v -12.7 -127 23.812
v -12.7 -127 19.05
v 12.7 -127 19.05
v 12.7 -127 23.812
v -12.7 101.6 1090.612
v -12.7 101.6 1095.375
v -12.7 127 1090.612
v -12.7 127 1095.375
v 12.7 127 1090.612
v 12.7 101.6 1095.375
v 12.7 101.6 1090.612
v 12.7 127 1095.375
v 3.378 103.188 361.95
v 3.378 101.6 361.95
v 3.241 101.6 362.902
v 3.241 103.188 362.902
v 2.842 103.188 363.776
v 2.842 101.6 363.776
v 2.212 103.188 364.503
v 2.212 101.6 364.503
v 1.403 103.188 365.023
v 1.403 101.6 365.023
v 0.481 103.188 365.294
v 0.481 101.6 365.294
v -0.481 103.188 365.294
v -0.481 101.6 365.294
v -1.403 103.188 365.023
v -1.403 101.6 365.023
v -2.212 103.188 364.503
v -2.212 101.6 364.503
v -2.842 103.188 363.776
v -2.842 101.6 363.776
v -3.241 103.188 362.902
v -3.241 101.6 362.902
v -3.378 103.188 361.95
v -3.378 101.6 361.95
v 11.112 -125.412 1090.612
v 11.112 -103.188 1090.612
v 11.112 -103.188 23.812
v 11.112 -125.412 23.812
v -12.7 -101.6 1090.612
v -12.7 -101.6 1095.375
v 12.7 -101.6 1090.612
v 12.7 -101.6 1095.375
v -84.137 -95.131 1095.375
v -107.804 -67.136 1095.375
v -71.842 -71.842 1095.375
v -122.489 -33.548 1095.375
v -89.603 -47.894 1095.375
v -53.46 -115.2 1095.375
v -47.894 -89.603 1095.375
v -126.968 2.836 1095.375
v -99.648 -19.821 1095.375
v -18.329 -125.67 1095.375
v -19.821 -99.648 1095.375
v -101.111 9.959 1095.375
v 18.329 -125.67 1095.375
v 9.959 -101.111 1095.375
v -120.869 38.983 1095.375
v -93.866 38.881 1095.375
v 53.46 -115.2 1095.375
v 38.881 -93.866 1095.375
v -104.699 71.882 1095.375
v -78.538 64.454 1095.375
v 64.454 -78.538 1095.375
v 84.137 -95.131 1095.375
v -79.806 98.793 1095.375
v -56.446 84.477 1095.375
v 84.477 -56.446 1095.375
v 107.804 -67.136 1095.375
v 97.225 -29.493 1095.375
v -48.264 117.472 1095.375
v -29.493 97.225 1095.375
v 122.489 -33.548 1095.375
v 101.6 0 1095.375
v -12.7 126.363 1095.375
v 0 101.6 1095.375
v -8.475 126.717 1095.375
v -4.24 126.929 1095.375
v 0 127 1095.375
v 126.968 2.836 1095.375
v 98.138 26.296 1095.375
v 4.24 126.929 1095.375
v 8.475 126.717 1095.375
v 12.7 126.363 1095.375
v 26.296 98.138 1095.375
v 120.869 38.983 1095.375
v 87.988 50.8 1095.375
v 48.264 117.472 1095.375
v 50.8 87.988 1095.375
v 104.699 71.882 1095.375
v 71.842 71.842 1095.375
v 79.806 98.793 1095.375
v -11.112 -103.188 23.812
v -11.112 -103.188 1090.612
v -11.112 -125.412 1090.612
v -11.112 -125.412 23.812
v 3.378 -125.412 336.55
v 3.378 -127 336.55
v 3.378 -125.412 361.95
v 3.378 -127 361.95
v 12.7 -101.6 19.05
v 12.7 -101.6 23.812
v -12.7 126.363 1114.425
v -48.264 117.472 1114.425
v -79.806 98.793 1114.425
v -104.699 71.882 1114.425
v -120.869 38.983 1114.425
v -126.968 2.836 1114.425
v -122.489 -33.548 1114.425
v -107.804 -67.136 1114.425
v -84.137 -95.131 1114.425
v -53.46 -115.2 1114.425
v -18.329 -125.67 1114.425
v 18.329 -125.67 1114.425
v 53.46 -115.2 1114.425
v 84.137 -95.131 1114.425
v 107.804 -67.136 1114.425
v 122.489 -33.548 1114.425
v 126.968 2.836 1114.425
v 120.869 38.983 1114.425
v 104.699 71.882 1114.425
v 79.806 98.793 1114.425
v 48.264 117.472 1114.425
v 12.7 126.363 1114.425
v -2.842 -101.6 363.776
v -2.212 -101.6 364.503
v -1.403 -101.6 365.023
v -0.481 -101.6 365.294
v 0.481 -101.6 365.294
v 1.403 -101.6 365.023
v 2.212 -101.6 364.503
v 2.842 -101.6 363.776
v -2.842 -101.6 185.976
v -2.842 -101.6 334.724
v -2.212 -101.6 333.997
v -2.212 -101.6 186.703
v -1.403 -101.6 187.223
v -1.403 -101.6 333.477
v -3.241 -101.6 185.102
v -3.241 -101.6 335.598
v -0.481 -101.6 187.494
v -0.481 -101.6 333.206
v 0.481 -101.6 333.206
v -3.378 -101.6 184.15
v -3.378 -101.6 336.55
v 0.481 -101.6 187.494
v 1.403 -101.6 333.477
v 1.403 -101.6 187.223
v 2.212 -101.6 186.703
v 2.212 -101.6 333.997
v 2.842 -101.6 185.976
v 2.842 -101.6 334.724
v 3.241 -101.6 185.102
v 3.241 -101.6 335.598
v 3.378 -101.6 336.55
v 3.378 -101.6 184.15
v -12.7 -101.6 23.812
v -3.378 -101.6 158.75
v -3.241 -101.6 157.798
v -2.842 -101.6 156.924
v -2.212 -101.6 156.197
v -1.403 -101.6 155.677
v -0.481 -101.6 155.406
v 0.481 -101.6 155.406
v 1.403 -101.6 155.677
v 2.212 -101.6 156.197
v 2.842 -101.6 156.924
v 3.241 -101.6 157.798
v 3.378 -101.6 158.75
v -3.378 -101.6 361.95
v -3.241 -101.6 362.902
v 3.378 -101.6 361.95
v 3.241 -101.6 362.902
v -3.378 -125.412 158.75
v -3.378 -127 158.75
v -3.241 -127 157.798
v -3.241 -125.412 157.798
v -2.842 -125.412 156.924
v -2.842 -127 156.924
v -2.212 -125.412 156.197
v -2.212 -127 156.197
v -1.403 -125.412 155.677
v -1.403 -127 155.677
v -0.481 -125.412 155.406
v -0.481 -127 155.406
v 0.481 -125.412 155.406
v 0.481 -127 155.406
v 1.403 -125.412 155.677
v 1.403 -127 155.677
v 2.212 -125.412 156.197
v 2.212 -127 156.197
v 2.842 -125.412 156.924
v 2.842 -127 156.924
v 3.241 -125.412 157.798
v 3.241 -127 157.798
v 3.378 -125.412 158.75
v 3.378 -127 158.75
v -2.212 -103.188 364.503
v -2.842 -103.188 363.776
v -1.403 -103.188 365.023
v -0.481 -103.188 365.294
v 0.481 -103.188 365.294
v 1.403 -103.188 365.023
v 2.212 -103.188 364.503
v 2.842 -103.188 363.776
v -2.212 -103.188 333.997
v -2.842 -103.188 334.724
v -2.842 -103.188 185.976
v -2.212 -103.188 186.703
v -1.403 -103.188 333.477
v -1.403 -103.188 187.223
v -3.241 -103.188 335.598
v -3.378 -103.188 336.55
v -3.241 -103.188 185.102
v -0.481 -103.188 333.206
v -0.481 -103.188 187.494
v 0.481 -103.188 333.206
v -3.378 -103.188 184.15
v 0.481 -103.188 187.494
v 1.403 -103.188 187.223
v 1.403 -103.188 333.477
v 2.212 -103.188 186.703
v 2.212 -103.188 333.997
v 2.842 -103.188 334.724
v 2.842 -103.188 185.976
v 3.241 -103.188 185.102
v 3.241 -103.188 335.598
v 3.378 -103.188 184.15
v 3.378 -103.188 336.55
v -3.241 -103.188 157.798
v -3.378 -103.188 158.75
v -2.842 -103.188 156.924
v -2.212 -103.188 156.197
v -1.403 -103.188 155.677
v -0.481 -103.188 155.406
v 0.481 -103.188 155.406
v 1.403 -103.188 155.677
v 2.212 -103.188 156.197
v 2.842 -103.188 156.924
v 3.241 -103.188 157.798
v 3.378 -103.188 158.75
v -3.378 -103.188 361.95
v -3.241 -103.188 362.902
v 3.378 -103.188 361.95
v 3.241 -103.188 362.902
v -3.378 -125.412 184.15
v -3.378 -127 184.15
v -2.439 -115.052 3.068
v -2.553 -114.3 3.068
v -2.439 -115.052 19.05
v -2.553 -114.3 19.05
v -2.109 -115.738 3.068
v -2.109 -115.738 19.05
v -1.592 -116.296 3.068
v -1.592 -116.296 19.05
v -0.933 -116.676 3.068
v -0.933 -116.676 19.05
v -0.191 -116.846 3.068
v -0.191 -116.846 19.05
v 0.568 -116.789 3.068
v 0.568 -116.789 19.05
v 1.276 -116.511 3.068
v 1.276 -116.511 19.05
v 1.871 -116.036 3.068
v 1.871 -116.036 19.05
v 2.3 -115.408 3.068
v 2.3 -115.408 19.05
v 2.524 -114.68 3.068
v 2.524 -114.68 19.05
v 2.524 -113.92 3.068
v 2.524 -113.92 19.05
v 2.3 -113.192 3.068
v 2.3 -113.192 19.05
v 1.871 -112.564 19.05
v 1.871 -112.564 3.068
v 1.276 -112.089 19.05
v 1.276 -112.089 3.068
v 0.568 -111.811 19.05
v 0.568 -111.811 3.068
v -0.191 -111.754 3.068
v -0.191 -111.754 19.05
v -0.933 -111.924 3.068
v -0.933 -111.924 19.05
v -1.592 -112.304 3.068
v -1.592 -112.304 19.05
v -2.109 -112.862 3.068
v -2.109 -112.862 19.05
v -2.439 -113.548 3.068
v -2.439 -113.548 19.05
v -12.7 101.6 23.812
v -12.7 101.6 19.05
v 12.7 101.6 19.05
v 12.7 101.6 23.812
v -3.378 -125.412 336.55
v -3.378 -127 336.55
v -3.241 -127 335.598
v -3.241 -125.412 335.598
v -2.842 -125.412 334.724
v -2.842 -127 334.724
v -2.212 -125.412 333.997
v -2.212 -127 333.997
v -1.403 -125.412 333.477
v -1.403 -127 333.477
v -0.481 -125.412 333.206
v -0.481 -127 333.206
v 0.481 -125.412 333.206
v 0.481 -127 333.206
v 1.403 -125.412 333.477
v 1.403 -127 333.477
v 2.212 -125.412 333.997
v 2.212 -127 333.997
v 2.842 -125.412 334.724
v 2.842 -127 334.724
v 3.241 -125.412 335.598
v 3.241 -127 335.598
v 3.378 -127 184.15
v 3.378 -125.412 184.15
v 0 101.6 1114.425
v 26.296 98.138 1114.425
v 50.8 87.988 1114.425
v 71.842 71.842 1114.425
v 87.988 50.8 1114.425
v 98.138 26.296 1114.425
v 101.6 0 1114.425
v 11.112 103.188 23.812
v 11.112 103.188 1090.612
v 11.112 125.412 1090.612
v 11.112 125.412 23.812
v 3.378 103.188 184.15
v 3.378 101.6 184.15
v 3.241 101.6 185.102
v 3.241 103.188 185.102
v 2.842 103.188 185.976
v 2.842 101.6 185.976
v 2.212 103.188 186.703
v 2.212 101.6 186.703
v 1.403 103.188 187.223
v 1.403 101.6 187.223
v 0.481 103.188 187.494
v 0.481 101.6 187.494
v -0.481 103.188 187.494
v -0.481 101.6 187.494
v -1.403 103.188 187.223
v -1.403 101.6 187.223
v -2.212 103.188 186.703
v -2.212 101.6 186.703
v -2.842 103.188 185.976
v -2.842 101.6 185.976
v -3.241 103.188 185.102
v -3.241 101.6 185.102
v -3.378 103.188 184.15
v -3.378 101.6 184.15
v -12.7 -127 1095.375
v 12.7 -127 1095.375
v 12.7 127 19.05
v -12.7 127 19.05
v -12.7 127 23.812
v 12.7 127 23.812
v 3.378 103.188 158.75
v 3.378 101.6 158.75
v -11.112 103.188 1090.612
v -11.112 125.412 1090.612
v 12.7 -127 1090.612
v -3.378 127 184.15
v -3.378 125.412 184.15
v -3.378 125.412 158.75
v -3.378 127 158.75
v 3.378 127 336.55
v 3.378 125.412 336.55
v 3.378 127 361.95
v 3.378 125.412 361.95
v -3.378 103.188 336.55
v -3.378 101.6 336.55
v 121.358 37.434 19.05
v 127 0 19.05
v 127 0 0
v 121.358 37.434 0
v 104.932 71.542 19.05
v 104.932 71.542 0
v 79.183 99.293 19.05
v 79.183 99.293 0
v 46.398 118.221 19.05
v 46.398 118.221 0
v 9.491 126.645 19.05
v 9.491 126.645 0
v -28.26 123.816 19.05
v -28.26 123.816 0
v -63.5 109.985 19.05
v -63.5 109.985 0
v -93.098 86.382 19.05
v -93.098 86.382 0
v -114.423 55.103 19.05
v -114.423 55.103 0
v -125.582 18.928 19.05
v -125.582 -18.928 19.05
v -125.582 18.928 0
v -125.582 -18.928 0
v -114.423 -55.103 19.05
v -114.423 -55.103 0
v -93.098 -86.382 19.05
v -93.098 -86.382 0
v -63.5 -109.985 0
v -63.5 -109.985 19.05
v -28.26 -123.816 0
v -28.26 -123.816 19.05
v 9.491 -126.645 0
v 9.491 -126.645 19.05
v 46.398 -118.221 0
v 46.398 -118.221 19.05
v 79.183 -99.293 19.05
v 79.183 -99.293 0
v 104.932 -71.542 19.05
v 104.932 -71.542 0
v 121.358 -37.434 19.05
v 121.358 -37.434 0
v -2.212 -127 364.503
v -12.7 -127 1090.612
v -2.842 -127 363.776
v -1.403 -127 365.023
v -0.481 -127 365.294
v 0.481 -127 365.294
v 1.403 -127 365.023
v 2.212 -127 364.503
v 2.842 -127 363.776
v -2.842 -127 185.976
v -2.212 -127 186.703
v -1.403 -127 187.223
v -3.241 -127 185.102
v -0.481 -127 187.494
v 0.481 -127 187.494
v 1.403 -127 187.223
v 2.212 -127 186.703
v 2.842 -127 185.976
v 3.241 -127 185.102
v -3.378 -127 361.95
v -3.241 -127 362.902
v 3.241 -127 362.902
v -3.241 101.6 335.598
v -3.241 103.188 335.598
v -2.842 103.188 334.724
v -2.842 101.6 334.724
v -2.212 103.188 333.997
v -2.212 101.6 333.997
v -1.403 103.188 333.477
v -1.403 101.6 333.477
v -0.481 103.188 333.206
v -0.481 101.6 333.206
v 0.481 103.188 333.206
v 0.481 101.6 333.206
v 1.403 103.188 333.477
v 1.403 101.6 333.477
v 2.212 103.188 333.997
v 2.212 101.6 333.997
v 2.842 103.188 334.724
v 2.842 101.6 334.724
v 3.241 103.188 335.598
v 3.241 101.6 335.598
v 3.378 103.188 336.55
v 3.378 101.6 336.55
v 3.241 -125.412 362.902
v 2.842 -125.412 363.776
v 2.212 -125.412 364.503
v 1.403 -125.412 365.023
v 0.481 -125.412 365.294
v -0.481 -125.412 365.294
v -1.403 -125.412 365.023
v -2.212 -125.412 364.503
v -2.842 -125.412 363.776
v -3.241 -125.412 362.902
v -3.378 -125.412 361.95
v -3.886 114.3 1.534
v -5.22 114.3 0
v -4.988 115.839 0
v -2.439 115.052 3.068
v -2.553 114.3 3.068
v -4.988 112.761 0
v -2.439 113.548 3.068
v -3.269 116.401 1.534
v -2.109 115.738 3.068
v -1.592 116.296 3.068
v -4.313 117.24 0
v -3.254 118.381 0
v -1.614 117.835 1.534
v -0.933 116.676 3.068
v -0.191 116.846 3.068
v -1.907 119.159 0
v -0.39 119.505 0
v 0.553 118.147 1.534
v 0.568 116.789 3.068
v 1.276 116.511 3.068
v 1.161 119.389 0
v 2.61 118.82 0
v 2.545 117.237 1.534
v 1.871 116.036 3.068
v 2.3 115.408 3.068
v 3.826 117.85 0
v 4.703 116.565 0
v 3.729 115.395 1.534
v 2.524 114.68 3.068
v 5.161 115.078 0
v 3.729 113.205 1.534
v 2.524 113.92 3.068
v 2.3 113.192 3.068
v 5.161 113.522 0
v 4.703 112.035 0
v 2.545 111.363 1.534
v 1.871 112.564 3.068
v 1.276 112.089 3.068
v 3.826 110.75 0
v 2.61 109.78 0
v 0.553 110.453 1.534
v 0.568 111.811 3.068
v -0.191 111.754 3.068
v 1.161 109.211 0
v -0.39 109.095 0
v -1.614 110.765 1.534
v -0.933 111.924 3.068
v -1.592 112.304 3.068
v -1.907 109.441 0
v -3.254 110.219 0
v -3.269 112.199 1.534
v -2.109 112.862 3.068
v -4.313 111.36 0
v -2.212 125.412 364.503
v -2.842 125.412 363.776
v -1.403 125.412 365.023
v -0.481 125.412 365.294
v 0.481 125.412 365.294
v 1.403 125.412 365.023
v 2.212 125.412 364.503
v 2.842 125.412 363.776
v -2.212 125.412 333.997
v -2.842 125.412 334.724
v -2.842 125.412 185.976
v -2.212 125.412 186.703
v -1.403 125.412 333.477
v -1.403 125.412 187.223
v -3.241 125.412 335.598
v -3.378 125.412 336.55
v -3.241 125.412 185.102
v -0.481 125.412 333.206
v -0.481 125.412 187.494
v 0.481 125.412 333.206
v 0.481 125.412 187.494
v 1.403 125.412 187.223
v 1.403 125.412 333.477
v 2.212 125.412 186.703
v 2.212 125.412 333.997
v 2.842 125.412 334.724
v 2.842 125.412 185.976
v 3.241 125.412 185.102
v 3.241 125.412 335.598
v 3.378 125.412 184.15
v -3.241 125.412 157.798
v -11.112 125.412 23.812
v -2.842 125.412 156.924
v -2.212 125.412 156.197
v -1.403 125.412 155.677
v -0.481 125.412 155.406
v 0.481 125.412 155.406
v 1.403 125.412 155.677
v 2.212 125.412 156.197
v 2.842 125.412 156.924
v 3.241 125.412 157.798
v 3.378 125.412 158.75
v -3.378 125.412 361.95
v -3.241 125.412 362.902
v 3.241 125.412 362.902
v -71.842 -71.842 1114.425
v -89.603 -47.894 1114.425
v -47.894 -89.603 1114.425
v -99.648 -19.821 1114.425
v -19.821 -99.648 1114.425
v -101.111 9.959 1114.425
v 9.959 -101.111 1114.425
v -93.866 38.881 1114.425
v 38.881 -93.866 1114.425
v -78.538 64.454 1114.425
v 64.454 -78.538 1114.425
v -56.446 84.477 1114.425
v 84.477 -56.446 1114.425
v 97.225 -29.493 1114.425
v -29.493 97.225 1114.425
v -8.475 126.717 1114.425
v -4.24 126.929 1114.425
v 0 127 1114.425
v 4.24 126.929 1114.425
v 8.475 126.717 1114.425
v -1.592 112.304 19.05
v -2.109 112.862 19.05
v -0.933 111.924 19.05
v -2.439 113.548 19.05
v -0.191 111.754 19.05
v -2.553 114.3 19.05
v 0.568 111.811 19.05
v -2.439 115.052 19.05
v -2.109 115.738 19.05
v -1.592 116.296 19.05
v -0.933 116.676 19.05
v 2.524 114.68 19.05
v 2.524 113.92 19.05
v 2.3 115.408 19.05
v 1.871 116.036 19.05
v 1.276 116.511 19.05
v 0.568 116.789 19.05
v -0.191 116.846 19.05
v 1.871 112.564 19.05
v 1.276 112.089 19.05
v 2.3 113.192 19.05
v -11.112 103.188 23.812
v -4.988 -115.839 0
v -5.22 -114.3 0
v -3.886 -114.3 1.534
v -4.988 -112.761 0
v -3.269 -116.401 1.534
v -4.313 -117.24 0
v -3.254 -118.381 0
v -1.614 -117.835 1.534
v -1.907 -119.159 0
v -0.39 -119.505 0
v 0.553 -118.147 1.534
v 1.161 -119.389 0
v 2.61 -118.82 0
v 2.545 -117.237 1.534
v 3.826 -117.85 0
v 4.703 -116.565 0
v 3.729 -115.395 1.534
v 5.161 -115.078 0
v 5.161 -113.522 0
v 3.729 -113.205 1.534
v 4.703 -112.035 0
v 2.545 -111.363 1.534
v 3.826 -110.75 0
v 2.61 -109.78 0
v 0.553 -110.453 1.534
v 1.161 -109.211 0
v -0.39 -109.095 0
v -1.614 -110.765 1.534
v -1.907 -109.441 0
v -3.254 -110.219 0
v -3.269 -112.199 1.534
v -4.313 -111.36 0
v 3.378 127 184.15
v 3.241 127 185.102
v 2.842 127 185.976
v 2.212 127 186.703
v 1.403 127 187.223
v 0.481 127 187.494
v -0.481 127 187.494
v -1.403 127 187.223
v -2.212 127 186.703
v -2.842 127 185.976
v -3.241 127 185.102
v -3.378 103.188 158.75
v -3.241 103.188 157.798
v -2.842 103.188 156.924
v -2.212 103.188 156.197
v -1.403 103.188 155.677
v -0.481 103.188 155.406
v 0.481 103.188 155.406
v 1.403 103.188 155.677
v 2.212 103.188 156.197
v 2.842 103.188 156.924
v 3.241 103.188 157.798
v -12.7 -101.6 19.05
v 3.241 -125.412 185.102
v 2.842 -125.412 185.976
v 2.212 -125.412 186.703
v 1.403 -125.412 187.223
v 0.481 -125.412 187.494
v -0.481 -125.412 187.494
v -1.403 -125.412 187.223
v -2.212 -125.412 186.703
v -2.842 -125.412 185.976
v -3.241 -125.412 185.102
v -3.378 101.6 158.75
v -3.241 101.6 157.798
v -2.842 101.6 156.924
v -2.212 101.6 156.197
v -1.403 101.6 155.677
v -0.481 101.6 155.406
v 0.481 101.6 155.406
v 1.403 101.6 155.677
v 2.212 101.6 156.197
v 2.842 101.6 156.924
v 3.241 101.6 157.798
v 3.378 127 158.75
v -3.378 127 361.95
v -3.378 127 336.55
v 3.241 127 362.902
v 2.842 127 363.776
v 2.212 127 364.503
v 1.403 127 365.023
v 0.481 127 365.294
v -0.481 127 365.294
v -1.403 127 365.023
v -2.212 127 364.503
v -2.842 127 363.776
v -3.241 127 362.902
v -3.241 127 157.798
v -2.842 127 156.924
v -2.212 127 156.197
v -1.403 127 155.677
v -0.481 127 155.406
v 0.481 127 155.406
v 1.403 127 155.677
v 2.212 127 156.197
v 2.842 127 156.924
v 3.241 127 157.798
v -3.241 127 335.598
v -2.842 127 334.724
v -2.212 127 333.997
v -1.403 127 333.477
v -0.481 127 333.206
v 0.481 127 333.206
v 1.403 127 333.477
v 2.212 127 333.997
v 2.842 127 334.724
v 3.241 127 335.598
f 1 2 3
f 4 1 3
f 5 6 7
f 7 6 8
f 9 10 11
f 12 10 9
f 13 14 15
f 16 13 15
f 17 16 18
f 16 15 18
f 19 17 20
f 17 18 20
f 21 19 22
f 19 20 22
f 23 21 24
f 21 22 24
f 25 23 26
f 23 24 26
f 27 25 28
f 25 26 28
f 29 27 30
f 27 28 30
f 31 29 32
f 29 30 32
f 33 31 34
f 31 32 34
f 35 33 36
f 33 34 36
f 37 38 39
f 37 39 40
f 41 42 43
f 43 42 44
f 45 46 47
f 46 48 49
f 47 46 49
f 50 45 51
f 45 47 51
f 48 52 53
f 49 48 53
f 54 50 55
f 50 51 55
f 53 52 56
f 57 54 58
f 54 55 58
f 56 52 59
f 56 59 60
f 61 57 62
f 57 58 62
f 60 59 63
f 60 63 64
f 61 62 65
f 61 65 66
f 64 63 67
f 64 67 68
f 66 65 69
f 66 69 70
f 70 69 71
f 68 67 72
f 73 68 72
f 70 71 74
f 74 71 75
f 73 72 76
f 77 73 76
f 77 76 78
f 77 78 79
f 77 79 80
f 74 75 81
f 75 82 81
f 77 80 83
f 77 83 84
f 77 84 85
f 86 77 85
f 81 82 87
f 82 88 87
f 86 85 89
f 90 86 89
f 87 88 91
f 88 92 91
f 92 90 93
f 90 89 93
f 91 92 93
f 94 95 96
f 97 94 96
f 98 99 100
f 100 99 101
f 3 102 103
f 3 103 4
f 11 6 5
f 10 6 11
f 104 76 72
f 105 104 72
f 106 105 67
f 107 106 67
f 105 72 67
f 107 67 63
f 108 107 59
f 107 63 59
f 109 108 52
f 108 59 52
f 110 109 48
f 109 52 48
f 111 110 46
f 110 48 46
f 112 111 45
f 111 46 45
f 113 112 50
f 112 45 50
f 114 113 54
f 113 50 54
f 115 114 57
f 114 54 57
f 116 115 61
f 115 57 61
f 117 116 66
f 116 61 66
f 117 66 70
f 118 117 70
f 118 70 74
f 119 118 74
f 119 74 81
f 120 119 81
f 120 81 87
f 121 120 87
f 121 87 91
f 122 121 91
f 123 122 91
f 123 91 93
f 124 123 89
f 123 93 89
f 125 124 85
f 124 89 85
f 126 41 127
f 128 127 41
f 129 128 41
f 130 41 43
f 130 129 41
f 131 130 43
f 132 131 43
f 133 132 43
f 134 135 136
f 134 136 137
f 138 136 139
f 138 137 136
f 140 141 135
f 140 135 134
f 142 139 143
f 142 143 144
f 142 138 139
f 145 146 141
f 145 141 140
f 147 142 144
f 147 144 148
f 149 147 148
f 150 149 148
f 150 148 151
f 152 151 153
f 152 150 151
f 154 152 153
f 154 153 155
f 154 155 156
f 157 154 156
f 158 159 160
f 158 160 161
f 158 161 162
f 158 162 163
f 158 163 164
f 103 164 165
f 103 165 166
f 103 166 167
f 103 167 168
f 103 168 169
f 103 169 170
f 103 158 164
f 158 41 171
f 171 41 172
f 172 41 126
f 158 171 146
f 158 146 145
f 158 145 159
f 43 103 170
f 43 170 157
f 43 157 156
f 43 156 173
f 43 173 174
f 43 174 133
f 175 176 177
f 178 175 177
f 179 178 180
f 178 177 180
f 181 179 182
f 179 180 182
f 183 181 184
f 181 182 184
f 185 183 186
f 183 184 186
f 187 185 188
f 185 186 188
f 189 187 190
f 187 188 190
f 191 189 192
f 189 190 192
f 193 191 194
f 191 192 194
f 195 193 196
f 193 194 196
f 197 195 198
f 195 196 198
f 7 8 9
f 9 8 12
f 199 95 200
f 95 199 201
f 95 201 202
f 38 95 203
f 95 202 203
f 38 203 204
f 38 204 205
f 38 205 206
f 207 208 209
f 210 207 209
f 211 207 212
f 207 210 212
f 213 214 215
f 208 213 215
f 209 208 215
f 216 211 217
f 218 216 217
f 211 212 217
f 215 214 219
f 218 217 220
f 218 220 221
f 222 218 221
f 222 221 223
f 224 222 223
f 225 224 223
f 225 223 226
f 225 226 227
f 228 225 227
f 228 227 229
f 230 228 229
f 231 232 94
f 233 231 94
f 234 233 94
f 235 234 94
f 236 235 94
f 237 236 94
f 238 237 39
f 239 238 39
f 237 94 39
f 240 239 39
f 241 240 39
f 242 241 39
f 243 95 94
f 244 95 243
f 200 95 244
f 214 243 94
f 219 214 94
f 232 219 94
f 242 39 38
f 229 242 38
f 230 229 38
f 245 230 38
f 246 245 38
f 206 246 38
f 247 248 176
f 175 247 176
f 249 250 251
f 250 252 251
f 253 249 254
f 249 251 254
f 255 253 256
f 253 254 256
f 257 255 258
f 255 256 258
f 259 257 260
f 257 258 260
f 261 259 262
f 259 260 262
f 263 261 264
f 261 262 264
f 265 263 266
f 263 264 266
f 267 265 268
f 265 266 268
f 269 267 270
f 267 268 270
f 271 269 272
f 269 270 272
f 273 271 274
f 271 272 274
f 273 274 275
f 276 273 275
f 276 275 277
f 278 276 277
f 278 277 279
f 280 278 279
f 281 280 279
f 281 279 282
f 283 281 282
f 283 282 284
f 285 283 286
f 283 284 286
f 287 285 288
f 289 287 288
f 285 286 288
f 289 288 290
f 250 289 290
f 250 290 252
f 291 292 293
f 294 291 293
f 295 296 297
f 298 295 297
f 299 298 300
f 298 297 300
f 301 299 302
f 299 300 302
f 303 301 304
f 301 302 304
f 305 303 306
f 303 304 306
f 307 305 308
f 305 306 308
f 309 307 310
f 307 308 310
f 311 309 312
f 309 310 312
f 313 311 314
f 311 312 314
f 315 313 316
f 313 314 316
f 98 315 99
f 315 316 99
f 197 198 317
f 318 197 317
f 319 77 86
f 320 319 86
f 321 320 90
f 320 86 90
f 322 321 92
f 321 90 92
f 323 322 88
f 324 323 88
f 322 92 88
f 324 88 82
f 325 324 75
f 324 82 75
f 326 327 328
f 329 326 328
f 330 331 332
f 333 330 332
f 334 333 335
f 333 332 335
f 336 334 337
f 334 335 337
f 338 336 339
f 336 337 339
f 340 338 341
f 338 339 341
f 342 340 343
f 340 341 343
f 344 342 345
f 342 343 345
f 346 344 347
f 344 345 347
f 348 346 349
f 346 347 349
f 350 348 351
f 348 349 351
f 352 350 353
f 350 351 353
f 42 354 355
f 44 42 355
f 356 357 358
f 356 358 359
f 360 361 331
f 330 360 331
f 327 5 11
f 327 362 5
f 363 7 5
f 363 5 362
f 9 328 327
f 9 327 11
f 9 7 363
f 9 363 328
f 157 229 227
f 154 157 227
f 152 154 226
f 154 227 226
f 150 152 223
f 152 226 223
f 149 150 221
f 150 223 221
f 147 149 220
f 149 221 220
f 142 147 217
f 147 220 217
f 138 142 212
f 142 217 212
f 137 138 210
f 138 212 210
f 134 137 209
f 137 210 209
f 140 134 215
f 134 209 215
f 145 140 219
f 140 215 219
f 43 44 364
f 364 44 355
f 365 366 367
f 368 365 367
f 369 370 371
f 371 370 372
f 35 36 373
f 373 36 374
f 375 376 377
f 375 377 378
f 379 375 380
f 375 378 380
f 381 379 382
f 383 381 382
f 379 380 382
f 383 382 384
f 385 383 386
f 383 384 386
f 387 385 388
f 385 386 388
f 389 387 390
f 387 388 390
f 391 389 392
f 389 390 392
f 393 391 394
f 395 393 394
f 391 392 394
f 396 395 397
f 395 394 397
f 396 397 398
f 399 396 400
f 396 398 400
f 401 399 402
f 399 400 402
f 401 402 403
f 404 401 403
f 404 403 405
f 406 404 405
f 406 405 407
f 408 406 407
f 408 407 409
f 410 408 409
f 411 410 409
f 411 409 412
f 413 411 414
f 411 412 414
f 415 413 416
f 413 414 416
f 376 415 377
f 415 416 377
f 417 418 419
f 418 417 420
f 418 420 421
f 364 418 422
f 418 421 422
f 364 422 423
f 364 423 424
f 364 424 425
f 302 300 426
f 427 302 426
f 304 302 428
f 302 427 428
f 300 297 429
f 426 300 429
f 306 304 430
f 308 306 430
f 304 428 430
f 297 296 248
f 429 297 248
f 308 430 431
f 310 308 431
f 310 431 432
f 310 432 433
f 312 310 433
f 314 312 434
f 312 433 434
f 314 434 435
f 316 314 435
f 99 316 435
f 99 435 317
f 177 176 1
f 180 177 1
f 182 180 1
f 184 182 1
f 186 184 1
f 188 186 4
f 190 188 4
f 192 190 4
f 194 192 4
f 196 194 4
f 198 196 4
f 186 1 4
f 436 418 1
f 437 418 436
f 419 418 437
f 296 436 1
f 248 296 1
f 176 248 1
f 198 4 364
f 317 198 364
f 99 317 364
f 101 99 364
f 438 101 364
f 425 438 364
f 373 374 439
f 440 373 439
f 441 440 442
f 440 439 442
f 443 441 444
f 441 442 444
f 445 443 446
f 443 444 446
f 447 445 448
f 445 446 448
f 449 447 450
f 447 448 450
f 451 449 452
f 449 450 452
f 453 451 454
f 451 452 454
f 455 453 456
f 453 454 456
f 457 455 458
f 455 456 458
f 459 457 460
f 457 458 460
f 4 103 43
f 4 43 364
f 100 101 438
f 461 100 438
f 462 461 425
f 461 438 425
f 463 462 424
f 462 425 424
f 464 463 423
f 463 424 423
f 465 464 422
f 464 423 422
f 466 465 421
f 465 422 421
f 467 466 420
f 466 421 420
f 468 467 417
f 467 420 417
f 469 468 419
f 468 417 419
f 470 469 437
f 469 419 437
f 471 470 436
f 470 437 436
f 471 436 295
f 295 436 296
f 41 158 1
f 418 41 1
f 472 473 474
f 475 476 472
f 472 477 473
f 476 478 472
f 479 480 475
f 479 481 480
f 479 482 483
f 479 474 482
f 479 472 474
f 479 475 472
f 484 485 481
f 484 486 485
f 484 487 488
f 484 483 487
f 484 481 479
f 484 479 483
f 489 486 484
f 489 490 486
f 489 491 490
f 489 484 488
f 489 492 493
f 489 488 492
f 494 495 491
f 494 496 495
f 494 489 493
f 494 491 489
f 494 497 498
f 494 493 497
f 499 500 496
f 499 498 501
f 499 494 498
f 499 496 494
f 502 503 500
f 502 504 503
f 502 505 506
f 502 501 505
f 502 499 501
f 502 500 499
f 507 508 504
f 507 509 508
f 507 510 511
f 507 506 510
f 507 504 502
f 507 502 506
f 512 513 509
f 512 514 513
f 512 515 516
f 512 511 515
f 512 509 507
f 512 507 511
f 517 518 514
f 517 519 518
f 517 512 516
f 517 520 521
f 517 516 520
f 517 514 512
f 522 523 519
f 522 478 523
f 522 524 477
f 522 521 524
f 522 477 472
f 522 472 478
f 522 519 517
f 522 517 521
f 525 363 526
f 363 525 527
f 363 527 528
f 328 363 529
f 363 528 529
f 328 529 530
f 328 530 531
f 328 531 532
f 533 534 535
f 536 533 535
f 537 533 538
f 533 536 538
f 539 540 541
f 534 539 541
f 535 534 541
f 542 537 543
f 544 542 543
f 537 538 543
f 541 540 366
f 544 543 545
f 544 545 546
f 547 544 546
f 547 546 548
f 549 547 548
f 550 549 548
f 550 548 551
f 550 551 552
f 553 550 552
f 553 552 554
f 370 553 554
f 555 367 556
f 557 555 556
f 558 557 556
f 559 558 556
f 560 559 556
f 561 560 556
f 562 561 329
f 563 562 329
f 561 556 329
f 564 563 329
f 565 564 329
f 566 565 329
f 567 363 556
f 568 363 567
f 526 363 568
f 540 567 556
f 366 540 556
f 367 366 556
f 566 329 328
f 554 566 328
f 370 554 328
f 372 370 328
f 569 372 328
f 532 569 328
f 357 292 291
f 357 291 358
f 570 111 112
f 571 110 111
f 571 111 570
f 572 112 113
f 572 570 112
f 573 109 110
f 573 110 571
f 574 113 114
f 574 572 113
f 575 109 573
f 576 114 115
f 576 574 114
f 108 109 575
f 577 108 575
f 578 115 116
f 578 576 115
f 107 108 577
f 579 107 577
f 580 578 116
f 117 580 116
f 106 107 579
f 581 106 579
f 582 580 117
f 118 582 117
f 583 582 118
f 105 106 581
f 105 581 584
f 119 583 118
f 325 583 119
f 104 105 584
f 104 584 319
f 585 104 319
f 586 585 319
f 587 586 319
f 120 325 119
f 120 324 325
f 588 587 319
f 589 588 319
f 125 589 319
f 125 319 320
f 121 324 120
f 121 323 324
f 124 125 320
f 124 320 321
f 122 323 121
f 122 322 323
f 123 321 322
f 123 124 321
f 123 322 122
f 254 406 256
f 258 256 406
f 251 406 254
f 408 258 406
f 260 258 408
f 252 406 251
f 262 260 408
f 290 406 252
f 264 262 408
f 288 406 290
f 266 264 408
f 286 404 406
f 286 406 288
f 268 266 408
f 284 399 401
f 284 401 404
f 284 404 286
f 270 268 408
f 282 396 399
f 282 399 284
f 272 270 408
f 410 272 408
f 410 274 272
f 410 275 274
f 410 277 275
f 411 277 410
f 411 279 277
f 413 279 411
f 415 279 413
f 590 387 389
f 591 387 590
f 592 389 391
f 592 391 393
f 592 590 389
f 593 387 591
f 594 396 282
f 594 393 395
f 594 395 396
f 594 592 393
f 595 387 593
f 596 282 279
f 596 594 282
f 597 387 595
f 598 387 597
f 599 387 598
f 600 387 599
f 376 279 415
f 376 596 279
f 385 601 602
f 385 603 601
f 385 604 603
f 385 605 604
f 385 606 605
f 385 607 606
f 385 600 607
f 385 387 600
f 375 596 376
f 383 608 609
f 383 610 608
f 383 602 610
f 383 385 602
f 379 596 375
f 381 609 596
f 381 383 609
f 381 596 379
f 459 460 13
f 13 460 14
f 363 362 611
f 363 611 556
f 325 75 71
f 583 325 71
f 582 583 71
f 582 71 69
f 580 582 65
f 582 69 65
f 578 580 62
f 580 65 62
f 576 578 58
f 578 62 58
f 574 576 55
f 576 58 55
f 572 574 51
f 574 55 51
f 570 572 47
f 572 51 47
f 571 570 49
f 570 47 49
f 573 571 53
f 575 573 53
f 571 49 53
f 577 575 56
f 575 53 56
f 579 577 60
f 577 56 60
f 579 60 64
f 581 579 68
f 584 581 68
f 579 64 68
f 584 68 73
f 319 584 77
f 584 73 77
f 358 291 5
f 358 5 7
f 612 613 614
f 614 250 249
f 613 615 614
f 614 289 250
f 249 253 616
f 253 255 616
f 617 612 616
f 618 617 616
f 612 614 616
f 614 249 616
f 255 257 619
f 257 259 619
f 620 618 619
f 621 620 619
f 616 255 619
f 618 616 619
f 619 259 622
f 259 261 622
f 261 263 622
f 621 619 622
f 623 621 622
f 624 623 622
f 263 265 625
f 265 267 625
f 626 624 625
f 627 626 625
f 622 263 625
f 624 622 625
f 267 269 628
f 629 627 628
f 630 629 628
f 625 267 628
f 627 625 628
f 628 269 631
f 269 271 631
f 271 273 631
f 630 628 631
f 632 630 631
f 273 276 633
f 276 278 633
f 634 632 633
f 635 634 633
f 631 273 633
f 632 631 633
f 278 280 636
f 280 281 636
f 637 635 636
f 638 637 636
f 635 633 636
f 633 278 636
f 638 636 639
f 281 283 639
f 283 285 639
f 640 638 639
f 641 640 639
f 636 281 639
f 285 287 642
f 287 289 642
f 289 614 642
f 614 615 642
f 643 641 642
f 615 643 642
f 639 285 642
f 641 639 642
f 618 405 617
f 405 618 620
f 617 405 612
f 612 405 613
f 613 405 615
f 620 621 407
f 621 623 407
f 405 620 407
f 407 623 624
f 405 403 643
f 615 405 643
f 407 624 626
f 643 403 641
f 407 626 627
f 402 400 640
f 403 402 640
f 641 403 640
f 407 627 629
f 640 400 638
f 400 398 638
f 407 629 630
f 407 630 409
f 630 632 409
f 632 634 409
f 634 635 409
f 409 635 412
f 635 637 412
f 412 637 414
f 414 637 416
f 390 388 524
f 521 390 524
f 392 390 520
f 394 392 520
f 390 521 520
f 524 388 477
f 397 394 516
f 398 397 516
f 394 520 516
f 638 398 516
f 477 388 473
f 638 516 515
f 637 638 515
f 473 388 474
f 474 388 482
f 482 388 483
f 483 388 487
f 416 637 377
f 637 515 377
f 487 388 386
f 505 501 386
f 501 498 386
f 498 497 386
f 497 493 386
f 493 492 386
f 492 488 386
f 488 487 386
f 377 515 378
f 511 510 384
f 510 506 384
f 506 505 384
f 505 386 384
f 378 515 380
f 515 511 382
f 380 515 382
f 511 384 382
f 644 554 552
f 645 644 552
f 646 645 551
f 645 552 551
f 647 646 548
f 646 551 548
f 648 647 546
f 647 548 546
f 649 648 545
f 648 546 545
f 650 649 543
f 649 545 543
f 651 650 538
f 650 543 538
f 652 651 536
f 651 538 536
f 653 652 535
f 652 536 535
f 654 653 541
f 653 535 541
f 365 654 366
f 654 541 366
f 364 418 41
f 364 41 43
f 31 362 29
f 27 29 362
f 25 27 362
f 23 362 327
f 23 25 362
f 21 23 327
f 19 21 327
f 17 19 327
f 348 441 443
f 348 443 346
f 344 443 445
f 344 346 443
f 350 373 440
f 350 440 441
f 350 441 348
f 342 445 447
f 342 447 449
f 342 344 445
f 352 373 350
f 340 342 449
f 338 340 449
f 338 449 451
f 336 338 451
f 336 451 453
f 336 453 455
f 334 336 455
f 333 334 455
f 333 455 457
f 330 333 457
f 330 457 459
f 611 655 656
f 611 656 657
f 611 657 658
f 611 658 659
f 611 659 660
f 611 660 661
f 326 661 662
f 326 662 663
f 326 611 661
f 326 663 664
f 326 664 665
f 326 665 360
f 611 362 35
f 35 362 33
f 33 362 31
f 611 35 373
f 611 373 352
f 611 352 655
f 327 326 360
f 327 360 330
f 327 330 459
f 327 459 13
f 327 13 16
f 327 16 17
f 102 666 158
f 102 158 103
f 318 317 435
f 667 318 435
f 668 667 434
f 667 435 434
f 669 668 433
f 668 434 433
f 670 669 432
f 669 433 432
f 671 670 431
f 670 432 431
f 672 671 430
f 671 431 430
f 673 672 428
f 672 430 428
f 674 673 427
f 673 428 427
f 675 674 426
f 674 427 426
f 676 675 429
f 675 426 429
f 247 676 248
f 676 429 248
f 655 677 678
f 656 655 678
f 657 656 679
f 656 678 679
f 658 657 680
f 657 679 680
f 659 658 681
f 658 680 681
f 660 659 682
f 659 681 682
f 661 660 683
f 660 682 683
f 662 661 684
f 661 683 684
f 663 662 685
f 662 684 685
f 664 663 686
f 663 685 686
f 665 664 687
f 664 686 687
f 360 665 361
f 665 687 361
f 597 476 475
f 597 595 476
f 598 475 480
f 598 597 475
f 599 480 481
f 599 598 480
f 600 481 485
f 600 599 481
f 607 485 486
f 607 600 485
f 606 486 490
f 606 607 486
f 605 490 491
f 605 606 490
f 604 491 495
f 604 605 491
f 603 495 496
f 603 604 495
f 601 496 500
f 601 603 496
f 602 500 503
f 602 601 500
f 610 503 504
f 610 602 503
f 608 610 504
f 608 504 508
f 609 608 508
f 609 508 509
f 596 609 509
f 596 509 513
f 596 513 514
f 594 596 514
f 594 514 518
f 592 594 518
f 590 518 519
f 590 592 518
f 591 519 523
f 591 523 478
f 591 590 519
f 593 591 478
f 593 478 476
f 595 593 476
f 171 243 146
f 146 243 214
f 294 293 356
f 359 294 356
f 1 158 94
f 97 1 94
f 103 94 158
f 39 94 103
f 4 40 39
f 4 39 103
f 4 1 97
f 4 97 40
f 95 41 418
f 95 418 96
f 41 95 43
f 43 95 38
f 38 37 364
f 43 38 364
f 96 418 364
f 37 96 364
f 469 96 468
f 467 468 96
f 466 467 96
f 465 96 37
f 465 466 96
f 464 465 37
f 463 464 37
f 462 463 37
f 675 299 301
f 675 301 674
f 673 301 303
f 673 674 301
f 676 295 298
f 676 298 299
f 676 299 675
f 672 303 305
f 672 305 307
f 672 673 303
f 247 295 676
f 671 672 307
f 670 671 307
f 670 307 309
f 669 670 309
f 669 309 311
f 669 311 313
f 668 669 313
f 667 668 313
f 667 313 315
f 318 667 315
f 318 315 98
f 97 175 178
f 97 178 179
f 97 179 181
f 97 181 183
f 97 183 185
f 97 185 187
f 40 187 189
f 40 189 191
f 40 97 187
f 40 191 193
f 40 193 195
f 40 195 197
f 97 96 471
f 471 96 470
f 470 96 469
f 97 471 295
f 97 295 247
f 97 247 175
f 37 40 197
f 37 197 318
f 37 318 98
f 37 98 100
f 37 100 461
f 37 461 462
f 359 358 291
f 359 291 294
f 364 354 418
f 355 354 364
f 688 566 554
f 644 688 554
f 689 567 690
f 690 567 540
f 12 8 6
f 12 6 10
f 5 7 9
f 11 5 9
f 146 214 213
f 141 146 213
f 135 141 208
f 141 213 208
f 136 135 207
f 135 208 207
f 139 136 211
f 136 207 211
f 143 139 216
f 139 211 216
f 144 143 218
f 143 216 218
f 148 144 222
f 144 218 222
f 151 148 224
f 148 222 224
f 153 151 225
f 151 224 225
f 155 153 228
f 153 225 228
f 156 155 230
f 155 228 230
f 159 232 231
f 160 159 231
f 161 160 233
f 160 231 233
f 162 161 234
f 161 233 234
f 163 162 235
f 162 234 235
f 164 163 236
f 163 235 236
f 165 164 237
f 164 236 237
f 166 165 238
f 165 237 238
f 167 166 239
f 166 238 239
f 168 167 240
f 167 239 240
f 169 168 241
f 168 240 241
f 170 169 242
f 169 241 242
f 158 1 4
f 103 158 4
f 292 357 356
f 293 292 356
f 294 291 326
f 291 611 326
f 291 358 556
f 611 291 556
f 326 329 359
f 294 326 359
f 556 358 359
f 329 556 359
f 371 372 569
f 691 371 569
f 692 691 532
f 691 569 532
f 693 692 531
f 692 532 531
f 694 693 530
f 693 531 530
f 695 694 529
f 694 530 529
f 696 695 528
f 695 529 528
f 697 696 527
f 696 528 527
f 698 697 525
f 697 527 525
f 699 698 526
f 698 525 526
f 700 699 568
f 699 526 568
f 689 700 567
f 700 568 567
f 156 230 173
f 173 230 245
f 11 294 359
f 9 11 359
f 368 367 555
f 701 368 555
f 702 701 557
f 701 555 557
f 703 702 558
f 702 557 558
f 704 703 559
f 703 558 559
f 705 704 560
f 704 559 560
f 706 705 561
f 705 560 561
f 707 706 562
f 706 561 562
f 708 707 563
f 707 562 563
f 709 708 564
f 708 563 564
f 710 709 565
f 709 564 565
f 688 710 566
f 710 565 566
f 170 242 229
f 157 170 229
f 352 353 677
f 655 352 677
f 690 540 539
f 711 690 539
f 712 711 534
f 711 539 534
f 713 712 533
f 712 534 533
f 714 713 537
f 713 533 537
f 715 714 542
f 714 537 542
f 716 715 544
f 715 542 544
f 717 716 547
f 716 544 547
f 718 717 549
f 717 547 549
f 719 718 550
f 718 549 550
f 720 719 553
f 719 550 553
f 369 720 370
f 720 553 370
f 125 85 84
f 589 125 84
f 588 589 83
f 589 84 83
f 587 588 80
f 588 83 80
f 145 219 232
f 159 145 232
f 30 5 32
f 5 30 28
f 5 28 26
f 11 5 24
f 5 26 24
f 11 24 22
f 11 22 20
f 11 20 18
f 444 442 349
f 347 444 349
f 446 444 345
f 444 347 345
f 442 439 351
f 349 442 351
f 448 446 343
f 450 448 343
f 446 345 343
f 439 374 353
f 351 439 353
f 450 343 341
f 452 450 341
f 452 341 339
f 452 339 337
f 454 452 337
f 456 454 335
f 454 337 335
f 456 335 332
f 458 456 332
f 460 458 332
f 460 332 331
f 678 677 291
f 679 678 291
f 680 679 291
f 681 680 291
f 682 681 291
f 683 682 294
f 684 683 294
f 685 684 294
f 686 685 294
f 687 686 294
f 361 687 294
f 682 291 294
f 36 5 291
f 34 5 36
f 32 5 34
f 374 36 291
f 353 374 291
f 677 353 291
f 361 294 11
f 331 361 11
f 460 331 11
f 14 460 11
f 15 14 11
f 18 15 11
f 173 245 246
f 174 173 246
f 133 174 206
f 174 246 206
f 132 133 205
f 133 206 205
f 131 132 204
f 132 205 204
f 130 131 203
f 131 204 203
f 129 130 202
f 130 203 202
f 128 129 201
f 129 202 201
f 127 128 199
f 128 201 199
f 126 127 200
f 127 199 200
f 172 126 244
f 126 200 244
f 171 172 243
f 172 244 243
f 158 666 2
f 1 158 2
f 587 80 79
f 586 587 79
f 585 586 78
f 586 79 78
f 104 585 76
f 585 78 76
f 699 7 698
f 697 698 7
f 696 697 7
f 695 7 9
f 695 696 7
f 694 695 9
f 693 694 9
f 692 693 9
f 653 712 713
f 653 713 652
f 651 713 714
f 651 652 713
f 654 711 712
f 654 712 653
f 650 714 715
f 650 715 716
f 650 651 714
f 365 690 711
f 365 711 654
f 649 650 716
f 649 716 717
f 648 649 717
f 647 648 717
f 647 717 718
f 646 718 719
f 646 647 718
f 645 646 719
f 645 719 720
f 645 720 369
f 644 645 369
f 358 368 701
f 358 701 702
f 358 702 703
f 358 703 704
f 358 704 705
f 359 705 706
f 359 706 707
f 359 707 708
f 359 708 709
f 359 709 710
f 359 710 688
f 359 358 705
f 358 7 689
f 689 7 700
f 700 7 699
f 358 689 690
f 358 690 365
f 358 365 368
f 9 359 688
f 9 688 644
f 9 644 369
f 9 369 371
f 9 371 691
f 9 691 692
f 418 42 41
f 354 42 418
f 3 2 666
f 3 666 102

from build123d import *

# Parameters (mm, degrees)
F0_R           = 127
F1_DEPTH       = 19.05
F3_D           = 5.1054
F3_CSINK_D     = 10.4394
F3_CSINK_ANGLE = 82
F5_W           = 25.4
F5_H           = 25.4
F6_DEPTH       = 4.7625
F7_W           = 25.4
F7_H           = 25.4
F7_W_2         = 22.225
F7_H_2         = 22.225
F8_DEPTH       = 1066.8
F13_DEPTH      = 19.05
F15_DEPTH      = 254.001


# Not quite as in the source:
# - a pattern or mirror of a feature is missing from the dataset's text; its kind, count and spacing are read off the source's solid


with BuildPart() as f1:
    # F0 (on Top) → F1 (new body)
    with BuildSketch(Plane.XY):
        Circle(F0_R)
    extrude(amount=F1_DEPTH)

    # F3 (through all)
    with Locations(Plane(origin=(0, 0, 0), x_dir=(1, 0, 0), z_dir=(0, 0, -1))):
        with Locations((0, 114.3)):
            f3 = CounterSinkHole(F3_D / 2, F3_CSINK_D / 2, counter_sink_angle=F3_CSINK_ANGLE)

    # F3_copies: F3 across plane
    add(f3.mirror(Plane.ZX), mode=Mode.SUBTRACT)


with BuildPart() as f6:
    # F5 (on face) → F6 (new body)
    with BuildSketch(Plane.XY.offset(19.05)):
        with Locations((0, 114.3)):
            Rectangle(F5_W, F5_H)
    extrude(amount=F6_DEPTH)


with BuildPart() as f8:
    # F7 (on face) → F8 (new body)
    with BuildSketch(Plane.XY.offset(23.8125)):
        with Locations((0, 114.3)):
            Rectangle(F7_W, F7_H)
        with Locations((0, 114.3)):
            Rectangle(F7_W_2, F7_H_2, mode=Mode.SUBTRACT)
    extrude(amount=F8_DEPTH)


with BuildPart() as f10_1:
    # F10: instance of F6
    add(f6.part.mirror(Plane(origin=(0, 114.3, 557.2125), x_dir=(1, 0, 0), z_dir=(0, 0, -1))))


with BuildPart() as f11_1:
    # F11: instance of F8
    add(f8.part.mirror(Plane.XZ))


with BuildPart() as f11_2:
    # F11: instance of F10_1
    add(f10_1.part.mirror(Plane.XZ))


with BuildPart() as f11_3:
    # F11: instance of F6
    add(f6.part.mirror(Plane.XZ))


with BuildPart() as f13:
    # F12 (on face) → F13 (new body)
    with BuildSketch(Plane.XY.offset(1095.375)):
        with BuildLine():
            ThreePointArc((-12.7, 126.3634045125), (-85.1941899427, -94.1857207861), (127, 0))
            ThreePointArc((127, 0), (94.1857207861, 85.1941899427), (12.7, 126.3634045125))
            Line((12.7, 126.3634045125), (12.7, 101.6))
            Line((12.7, 101.6), (0, 101.6))
            Line((0, 101.6), (-12.7, 101.6))
            Line((-12.7, 101.6), (-12.7, 126.3634045125))
        make_face()
        with BuildLine():
            ThreePointArc((101.6, 0), (-71.8420489686, -71.8420489686), (0, 101.6))
            ThreePointArc((0, 101.6), (71.8420489686, 71.8420489686), (101.6, 0))
        make_face(mode=Mode.SUBTRACT)
        with BuildLine():
            Line((12.7, 101.6), (12.7, 126.3634045125))
            ThreePointArc((12.7, 126.3634045125), (6.3579724326, 126.840751285), (0, 127))
            ThreePointArc((0, 127), (-6.3579724326, 126.840751285), (-12.7, 126.3634045125))
            Line((-12.7, 126.3634045125), (-12.7, 101.6))
            Line((-12.7, 101.6), (0, 101.6))
            Line((0, 101.6), (12.7, 101.6))
        make_face()
    extrude(amount=F13_DEPTH)


with BuildPart() as f15_tool:
    # F14 (on face) → F15 (new body, through all)
    with BuildSketch(Plane.XZ.offset(127)):
        with BuildLine():
            ThreePointArc((3.3782, 361.95), (0, 365.3282), (-3.3782, 361.95))
            Line((-3.3782, 361.95), (-3.3782, 336.55))
            ThreePointArc((-3.3782, 336.55), (0, 333.1718), (3.3782, 336.55))
            Line((3.3782, 336.55), (3.3782, 361.95))
        make_face()
        with BuildLine():
            ThreePointArc((3.3782, 184.15), (0, 187.5282), (-3.3782, 184.15))
            Line((-3.3782, 184.15), (-3.3782, 158.75))
            ThreePointArc((-3.3782, 158.75), (0, 155.3718), (3.3782, 158.75))
            Line((3.3782, 158.75), (3.3782, 184.15))
        make_face()
    extrude(amount=-F15_DEPTH)


with BuildPart() as f8_1:
    add(f8.part)

    # F15: cut by f15_tool
    add(f15_tool.part, mode=Mode.SUBTRACT)


with BuildPart() as f11_1_1:
    add(f11_1.part)

    # F15: cut by f15_tool
    add(f15_tool.part, mode=Mode.SUBTRACT)


solid = Compound([f1.part, f6.part, f10_1.part, f11_2.part, f11_3.part, f13.part, f8_1.part, f11_1_1.part])
